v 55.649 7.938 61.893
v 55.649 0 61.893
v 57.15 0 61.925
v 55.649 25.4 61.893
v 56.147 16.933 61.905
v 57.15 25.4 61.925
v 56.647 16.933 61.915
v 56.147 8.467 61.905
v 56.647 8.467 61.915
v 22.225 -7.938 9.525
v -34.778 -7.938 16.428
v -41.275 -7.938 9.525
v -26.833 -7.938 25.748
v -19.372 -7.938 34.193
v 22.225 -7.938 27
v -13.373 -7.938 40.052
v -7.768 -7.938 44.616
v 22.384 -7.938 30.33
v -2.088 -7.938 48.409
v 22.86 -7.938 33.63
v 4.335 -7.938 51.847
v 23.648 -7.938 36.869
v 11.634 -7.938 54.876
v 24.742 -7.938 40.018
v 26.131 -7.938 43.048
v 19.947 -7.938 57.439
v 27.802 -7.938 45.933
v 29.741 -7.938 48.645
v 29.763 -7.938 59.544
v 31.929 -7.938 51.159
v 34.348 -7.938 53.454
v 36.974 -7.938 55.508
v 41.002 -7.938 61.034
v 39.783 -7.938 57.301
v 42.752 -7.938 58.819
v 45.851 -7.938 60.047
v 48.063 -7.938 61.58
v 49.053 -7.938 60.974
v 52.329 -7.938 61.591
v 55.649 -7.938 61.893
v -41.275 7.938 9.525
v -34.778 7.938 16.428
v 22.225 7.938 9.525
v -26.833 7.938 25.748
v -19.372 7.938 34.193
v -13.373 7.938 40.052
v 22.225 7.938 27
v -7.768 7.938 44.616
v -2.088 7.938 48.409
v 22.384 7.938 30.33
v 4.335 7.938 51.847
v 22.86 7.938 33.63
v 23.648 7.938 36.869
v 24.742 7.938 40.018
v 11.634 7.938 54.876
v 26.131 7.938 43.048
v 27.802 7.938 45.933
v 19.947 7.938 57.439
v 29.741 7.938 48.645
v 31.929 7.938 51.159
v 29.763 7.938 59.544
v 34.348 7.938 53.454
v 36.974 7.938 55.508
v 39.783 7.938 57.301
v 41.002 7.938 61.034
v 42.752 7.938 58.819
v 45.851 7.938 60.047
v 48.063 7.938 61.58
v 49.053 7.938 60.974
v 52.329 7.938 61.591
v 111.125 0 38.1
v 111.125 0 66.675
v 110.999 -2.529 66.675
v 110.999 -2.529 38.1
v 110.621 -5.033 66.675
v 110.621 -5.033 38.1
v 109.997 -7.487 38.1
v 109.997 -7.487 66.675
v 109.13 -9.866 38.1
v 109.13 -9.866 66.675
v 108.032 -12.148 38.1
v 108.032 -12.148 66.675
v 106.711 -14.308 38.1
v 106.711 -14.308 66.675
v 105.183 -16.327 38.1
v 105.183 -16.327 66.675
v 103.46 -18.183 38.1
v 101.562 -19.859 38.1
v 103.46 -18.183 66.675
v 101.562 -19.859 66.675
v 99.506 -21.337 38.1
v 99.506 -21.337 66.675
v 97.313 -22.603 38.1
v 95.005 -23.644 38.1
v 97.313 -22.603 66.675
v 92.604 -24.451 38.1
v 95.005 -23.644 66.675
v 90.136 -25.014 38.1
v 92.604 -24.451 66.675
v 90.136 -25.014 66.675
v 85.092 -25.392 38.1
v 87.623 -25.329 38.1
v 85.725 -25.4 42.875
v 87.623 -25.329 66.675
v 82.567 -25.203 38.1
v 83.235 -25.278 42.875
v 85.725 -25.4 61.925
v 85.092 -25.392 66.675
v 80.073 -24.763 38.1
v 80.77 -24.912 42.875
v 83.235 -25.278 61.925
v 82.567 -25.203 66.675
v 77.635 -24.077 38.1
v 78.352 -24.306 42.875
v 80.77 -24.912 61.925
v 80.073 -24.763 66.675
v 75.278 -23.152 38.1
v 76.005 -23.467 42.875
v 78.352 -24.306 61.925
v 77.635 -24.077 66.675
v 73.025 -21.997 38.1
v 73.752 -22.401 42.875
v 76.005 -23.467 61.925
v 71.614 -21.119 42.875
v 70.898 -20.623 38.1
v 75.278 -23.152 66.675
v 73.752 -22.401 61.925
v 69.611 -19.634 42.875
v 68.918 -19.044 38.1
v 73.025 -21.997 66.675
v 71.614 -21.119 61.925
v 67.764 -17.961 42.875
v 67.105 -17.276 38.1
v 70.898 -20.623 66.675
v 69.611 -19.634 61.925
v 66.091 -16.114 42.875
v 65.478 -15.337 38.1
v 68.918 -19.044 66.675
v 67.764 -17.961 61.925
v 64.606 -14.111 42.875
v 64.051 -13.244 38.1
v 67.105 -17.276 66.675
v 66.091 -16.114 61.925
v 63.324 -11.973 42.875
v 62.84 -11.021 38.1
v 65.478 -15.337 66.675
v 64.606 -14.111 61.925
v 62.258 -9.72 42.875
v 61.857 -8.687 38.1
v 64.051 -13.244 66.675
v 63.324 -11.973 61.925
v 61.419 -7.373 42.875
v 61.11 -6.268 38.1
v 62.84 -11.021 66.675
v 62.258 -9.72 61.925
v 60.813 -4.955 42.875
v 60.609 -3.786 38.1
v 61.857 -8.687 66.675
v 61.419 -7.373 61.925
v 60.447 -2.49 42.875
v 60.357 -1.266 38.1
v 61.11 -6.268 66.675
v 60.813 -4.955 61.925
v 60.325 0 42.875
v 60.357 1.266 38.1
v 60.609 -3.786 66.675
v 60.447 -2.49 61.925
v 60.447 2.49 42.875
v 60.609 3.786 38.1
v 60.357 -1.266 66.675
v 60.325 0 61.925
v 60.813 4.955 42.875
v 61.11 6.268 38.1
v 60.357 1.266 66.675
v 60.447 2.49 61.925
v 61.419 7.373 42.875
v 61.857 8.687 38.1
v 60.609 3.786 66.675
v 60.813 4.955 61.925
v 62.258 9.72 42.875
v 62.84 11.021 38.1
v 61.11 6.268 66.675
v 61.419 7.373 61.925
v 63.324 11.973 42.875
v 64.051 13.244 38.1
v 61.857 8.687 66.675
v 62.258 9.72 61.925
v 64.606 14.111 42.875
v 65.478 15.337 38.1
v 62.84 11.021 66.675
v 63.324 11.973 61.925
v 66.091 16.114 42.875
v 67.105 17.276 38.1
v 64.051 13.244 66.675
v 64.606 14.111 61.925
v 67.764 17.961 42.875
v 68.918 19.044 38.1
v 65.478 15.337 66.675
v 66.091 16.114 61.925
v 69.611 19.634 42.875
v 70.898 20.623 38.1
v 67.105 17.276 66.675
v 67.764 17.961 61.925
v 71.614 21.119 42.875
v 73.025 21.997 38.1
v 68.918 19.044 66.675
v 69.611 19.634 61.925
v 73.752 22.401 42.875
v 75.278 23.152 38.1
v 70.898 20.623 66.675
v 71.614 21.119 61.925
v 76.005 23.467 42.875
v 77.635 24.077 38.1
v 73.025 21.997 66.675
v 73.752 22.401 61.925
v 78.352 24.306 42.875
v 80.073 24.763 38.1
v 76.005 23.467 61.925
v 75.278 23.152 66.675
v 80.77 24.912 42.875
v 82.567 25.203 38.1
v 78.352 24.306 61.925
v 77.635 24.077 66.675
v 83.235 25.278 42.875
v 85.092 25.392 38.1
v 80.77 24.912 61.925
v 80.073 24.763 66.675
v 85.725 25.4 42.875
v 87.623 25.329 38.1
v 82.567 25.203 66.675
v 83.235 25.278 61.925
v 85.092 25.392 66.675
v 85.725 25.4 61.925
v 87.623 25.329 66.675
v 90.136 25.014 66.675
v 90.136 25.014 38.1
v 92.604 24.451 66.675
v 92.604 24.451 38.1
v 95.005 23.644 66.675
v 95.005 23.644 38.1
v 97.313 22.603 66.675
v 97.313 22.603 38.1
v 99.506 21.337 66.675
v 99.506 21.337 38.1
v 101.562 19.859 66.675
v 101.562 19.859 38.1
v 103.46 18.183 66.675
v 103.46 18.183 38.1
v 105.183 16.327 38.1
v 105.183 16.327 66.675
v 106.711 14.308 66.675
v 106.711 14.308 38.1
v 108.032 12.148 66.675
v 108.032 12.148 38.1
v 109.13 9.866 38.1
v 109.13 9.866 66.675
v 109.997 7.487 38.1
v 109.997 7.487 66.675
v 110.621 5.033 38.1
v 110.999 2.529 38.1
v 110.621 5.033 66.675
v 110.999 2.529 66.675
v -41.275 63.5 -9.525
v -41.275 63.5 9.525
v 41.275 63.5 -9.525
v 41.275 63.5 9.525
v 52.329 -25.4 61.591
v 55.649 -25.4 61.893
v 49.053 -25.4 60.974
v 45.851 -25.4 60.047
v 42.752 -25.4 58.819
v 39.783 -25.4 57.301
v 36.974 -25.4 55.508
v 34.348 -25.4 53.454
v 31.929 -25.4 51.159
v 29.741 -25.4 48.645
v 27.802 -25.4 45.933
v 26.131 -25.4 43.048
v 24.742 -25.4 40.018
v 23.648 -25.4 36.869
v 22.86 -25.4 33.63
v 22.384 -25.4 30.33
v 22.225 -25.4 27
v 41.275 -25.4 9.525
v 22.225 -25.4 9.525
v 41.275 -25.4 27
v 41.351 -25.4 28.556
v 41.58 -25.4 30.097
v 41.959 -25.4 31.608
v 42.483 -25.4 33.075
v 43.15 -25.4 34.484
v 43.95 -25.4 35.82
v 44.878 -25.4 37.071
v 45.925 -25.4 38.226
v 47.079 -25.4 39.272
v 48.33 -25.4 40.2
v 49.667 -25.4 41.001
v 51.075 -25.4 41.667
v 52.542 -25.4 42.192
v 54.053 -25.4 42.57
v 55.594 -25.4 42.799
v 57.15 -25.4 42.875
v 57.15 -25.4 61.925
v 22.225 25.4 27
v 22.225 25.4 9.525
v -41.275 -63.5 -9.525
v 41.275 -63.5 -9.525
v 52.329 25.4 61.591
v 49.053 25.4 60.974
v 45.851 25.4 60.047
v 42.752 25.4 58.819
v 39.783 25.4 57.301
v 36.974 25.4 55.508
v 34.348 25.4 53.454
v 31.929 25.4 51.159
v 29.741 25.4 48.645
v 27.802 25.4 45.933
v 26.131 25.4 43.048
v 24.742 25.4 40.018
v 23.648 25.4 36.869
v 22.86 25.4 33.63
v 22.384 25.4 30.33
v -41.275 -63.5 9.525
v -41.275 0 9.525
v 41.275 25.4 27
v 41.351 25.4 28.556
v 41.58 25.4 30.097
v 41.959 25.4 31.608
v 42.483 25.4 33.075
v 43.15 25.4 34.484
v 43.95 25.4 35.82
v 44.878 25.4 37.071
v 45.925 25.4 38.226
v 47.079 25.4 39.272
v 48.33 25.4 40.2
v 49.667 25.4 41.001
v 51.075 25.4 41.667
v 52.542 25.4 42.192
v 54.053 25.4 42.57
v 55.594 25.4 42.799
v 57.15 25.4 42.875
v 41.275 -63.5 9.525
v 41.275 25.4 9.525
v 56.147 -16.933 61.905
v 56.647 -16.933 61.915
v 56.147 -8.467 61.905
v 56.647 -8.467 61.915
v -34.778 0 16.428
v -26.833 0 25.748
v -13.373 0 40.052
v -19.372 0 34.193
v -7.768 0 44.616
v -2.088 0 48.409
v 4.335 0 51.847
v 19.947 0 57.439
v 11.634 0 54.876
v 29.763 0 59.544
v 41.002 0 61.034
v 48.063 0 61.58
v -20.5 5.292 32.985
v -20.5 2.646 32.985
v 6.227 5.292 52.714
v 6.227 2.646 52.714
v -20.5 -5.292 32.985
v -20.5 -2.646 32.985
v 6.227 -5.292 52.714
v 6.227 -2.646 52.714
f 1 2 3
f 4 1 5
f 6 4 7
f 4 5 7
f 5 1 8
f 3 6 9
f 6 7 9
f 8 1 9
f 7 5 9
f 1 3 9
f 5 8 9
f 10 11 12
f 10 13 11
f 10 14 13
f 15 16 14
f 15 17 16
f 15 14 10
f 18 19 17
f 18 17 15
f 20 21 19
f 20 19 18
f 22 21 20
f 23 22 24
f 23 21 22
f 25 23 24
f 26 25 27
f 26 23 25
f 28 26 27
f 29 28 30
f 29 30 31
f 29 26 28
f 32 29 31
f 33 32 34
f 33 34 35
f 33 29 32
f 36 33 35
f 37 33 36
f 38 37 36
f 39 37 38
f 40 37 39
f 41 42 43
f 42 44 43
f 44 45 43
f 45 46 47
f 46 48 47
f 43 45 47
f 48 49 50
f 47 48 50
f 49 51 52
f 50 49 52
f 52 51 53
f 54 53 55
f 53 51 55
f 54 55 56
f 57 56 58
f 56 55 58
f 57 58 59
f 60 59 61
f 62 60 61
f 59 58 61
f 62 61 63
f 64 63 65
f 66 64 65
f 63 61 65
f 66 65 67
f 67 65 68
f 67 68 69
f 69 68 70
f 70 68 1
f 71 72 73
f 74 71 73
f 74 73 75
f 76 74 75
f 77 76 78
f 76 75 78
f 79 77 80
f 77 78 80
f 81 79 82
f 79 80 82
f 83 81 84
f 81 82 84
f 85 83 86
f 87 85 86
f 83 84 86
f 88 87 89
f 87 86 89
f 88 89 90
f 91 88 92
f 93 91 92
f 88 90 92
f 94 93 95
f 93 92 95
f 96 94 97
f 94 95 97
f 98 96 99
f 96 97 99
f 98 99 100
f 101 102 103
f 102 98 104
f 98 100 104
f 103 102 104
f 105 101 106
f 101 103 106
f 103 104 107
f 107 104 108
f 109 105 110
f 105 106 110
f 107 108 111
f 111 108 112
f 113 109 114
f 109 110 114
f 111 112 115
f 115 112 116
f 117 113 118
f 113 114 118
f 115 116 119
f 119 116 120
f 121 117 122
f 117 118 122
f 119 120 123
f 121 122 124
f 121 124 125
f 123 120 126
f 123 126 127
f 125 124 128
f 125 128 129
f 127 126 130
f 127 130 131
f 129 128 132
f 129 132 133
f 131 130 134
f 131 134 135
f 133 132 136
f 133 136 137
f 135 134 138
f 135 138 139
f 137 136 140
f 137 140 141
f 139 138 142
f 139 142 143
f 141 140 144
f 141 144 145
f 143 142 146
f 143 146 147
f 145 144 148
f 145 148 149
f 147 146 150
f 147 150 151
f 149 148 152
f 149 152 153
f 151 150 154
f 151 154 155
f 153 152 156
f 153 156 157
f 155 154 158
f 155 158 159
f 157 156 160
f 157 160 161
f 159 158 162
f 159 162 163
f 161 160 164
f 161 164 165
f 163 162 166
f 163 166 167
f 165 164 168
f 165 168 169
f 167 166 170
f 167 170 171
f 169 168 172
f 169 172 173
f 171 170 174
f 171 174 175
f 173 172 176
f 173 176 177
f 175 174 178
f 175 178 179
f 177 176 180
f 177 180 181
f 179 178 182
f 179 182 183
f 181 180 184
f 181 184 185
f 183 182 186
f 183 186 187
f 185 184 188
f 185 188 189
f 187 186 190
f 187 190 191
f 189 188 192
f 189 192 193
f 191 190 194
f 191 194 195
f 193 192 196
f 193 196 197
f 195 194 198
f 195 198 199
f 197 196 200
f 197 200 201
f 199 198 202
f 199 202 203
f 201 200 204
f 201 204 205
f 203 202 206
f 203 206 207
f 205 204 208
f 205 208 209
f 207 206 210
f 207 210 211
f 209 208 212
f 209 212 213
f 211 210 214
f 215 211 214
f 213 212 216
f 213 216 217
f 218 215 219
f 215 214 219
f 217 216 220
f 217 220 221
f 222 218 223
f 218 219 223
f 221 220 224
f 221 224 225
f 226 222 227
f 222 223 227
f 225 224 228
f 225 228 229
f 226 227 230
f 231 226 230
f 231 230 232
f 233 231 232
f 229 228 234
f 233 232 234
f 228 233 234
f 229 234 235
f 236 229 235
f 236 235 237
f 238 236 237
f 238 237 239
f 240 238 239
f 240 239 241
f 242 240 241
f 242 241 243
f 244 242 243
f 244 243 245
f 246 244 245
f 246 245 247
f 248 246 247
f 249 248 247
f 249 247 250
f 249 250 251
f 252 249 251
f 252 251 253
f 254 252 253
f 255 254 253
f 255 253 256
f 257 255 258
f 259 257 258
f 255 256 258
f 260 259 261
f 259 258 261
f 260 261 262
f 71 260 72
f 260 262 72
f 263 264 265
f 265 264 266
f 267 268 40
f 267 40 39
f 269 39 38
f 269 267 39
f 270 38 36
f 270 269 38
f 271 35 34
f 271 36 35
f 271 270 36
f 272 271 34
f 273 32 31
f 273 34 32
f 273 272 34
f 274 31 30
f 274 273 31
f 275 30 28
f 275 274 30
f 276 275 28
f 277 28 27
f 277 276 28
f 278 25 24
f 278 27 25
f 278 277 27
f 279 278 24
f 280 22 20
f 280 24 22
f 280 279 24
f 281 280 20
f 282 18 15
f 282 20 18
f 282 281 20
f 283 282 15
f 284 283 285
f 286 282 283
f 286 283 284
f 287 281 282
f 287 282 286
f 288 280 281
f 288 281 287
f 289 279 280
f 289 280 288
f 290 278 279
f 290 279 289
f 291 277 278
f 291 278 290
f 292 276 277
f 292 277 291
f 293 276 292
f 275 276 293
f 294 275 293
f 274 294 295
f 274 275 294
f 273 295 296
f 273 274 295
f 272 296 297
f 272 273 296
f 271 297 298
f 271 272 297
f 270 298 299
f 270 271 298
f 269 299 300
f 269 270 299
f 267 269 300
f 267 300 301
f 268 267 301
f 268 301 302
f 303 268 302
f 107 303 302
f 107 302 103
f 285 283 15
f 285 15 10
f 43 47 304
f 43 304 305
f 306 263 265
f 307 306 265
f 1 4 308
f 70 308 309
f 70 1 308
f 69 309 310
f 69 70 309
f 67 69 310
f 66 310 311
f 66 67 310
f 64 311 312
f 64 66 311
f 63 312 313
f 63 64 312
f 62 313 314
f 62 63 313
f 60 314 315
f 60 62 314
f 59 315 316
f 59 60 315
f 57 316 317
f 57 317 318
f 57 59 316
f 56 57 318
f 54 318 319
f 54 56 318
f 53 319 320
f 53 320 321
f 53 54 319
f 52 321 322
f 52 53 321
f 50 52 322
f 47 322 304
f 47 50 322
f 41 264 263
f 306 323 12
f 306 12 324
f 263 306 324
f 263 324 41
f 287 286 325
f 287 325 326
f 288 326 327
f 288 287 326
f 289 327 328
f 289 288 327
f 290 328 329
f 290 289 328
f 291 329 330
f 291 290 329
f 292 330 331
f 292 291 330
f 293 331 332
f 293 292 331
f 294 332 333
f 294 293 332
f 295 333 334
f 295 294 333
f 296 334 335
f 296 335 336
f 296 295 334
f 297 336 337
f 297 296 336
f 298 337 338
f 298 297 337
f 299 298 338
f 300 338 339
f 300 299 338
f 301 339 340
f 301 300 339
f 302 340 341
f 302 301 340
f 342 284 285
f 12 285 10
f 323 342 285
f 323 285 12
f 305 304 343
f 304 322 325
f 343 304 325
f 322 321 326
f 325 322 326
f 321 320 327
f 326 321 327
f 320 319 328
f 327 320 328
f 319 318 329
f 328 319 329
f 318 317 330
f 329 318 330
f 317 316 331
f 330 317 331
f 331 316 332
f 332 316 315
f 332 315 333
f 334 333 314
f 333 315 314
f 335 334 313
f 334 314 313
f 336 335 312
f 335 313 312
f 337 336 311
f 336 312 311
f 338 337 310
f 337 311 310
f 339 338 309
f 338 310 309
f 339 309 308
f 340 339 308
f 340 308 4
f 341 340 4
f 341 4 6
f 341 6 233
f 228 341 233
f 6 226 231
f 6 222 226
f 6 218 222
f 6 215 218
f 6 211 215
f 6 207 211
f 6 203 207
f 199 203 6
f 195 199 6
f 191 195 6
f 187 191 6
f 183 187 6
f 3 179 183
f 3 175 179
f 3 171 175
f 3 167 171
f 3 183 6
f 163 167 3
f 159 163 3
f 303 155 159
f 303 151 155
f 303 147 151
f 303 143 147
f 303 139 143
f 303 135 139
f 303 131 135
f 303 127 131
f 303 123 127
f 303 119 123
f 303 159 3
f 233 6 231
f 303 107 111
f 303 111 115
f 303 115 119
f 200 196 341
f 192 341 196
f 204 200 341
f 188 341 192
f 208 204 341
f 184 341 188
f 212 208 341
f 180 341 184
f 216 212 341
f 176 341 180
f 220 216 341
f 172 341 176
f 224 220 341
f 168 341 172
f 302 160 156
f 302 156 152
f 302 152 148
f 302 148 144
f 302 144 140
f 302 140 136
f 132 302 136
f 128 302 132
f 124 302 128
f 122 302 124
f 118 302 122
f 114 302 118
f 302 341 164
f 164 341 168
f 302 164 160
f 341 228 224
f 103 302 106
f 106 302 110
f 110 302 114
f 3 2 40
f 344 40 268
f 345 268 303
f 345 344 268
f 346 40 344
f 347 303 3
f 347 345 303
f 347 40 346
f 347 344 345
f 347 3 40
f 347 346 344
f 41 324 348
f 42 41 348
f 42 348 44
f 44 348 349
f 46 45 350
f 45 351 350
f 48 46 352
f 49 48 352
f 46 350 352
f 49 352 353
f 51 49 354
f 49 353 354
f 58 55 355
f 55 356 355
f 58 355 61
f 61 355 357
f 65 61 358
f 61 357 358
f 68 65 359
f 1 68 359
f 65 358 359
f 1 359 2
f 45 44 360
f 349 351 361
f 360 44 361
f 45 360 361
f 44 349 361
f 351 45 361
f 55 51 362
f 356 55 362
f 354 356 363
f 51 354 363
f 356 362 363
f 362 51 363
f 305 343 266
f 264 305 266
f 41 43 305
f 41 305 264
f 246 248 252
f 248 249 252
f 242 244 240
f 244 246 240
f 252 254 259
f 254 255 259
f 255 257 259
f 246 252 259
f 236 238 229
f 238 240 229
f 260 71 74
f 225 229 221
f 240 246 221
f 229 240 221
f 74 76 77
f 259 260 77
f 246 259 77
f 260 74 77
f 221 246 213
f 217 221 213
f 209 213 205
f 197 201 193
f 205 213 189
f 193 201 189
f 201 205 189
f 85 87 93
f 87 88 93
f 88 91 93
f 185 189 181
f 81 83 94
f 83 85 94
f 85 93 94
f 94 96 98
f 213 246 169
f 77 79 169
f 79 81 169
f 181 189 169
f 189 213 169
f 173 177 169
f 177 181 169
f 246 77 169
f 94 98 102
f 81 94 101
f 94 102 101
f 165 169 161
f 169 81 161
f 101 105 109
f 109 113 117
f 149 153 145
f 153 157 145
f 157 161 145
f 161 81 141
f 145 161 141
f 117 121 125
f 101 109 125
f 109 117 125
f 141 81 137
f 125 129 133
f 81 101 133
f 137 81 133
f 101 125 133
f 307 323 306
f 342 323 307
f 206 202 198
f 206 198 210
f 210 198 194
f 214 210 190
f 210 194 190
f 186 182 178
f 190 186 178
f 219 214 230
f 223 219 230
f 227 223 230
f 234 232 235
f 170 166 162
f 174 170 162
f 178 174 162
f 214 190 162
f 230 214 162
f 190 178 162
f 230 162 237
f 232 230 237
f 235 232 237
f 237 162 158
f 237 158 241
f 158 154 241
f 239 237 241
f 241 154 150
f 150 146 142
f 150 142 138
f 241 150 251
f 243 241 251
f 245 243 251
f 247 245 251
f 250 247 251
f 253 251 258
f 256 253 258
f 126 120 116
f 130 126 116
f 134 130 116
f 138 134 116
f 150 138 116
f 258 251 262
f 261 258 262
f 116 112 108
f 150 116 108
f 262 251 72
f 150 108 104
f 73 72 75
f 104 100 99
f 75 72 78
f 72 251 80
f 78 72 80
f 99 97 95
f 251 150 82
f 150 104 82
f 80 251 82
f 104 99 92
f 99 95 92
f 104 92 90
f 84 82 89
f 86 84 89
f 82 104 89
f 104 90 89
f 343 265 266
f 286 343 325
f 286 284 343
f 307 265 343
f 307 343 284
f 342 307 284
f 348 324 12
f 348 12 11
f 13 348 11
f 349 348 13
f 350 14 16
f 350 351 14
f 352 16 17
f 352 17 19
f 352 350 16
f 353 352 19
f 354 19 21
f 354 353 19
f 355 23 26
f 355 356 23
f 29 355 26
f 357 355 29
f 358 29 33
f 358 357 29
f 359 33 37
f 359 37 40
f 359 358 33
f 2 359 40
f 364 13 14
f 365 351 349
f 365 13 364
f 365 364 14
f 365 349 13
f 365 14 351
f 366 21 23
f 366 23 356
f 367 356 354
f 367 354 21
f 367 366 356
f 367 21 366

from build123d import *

# Parameters (mm, degrees)
F1_DEPTH = 63.5
F2_DEPTH = 25.4
F3_DEPTH = 7.9375


with BuildPart() as f1:
    # F0 (on Front) → F1 (new body, symmetric)
    with BuildSketch(Plane.XZ):
        Polygon((41.275, -9.525), (41.275, 9.525), (22.225, 9.525), (-41.275, 9.525), (-41.275, -9.525), align=None)
    extrude(amount=F1_DEPTH, both=True)

    # F0 (on Front) → F2 (join, symmetric)
    with BuildSketch(Plane.XZ):
        with BuildLine():
            Line((22.225, 9.525), (41.275, 9.525))
            Line((41.275, 9.525), (41.275, 27.0002))
            ThreePointArc((41.275, 27.0002), (45.92468, 38.22552), (57.15, 42.8752))
            Line((57.15, 42.8752), (60.325, 42.8752))
            Line((60.325, 42.8752), (60.325, 61.9252))
            Line((60.325, 61.9252), (57.15, 61.9252))
            add(Edge.make_bspline(
                [(55.649062, 61.892933), (56.146045, 61.905154), (56.646347, 61.915914), (57.15, 61.9252)],
                knots=[110.675556, 110.675556, 110.675556, 110.675556, 111.504536, 111.504536, 111.504536, 111.504536], degree=3))
            ThreePointArc((55.649062, 61.892933), (31.929216, 51.159415), (22.225, 27.0002))
            Line((22.225, 27.0002), (22.225, 9.525))
        make_face()
        Polygon((60.325, 61.9252), (60.325, 42.8752), (85.725, 42.8752), (85.725, 52.3875), (85.725, 61.9252), align=None)
    extrude(amount=F2_DEPTH, both=True)

    # F0 (on Front) → F3 (join, symmetric)
    with BuildSketch(Plane.XZ):
        with BuildLine():
            Line((-41.275, 9.525), (22.225, 9.525))
            Line((22.225, 9.525), (22.225, 27.0002))
            ThreePointArc((22.225, 27.0002), (31.929216, 51.159415), (55.649062, 61.892933))
            add(Edge.make_bspline(
                [(-41.275, 9.525), (-17.894272, 32.578413), (-10.702219, 60.261258), (55.649062, 61.892933)],
                knots=[0, 0, 0, 0, 110.675556, 110.675556, 110.675556, 110.675556], degree=3))
        make_face()
    extrude(amount=F3_DEPTH, both=True)

    # F0 (on Front) → F4 (revolve)
    with BuildSketch(Plane.XZ):
        Polygon((85.725, 52.3875), (85.725, 42.8752), (85.725, 38.1), (111.125, 38.1), (111.125, 66.675), (85.725, 66.675), (85.725, 61.9252), align=None)
    revolve(axis=Axis((85.725, 0, 52.3875), (0, 0, -1)))


solid = f1.part
